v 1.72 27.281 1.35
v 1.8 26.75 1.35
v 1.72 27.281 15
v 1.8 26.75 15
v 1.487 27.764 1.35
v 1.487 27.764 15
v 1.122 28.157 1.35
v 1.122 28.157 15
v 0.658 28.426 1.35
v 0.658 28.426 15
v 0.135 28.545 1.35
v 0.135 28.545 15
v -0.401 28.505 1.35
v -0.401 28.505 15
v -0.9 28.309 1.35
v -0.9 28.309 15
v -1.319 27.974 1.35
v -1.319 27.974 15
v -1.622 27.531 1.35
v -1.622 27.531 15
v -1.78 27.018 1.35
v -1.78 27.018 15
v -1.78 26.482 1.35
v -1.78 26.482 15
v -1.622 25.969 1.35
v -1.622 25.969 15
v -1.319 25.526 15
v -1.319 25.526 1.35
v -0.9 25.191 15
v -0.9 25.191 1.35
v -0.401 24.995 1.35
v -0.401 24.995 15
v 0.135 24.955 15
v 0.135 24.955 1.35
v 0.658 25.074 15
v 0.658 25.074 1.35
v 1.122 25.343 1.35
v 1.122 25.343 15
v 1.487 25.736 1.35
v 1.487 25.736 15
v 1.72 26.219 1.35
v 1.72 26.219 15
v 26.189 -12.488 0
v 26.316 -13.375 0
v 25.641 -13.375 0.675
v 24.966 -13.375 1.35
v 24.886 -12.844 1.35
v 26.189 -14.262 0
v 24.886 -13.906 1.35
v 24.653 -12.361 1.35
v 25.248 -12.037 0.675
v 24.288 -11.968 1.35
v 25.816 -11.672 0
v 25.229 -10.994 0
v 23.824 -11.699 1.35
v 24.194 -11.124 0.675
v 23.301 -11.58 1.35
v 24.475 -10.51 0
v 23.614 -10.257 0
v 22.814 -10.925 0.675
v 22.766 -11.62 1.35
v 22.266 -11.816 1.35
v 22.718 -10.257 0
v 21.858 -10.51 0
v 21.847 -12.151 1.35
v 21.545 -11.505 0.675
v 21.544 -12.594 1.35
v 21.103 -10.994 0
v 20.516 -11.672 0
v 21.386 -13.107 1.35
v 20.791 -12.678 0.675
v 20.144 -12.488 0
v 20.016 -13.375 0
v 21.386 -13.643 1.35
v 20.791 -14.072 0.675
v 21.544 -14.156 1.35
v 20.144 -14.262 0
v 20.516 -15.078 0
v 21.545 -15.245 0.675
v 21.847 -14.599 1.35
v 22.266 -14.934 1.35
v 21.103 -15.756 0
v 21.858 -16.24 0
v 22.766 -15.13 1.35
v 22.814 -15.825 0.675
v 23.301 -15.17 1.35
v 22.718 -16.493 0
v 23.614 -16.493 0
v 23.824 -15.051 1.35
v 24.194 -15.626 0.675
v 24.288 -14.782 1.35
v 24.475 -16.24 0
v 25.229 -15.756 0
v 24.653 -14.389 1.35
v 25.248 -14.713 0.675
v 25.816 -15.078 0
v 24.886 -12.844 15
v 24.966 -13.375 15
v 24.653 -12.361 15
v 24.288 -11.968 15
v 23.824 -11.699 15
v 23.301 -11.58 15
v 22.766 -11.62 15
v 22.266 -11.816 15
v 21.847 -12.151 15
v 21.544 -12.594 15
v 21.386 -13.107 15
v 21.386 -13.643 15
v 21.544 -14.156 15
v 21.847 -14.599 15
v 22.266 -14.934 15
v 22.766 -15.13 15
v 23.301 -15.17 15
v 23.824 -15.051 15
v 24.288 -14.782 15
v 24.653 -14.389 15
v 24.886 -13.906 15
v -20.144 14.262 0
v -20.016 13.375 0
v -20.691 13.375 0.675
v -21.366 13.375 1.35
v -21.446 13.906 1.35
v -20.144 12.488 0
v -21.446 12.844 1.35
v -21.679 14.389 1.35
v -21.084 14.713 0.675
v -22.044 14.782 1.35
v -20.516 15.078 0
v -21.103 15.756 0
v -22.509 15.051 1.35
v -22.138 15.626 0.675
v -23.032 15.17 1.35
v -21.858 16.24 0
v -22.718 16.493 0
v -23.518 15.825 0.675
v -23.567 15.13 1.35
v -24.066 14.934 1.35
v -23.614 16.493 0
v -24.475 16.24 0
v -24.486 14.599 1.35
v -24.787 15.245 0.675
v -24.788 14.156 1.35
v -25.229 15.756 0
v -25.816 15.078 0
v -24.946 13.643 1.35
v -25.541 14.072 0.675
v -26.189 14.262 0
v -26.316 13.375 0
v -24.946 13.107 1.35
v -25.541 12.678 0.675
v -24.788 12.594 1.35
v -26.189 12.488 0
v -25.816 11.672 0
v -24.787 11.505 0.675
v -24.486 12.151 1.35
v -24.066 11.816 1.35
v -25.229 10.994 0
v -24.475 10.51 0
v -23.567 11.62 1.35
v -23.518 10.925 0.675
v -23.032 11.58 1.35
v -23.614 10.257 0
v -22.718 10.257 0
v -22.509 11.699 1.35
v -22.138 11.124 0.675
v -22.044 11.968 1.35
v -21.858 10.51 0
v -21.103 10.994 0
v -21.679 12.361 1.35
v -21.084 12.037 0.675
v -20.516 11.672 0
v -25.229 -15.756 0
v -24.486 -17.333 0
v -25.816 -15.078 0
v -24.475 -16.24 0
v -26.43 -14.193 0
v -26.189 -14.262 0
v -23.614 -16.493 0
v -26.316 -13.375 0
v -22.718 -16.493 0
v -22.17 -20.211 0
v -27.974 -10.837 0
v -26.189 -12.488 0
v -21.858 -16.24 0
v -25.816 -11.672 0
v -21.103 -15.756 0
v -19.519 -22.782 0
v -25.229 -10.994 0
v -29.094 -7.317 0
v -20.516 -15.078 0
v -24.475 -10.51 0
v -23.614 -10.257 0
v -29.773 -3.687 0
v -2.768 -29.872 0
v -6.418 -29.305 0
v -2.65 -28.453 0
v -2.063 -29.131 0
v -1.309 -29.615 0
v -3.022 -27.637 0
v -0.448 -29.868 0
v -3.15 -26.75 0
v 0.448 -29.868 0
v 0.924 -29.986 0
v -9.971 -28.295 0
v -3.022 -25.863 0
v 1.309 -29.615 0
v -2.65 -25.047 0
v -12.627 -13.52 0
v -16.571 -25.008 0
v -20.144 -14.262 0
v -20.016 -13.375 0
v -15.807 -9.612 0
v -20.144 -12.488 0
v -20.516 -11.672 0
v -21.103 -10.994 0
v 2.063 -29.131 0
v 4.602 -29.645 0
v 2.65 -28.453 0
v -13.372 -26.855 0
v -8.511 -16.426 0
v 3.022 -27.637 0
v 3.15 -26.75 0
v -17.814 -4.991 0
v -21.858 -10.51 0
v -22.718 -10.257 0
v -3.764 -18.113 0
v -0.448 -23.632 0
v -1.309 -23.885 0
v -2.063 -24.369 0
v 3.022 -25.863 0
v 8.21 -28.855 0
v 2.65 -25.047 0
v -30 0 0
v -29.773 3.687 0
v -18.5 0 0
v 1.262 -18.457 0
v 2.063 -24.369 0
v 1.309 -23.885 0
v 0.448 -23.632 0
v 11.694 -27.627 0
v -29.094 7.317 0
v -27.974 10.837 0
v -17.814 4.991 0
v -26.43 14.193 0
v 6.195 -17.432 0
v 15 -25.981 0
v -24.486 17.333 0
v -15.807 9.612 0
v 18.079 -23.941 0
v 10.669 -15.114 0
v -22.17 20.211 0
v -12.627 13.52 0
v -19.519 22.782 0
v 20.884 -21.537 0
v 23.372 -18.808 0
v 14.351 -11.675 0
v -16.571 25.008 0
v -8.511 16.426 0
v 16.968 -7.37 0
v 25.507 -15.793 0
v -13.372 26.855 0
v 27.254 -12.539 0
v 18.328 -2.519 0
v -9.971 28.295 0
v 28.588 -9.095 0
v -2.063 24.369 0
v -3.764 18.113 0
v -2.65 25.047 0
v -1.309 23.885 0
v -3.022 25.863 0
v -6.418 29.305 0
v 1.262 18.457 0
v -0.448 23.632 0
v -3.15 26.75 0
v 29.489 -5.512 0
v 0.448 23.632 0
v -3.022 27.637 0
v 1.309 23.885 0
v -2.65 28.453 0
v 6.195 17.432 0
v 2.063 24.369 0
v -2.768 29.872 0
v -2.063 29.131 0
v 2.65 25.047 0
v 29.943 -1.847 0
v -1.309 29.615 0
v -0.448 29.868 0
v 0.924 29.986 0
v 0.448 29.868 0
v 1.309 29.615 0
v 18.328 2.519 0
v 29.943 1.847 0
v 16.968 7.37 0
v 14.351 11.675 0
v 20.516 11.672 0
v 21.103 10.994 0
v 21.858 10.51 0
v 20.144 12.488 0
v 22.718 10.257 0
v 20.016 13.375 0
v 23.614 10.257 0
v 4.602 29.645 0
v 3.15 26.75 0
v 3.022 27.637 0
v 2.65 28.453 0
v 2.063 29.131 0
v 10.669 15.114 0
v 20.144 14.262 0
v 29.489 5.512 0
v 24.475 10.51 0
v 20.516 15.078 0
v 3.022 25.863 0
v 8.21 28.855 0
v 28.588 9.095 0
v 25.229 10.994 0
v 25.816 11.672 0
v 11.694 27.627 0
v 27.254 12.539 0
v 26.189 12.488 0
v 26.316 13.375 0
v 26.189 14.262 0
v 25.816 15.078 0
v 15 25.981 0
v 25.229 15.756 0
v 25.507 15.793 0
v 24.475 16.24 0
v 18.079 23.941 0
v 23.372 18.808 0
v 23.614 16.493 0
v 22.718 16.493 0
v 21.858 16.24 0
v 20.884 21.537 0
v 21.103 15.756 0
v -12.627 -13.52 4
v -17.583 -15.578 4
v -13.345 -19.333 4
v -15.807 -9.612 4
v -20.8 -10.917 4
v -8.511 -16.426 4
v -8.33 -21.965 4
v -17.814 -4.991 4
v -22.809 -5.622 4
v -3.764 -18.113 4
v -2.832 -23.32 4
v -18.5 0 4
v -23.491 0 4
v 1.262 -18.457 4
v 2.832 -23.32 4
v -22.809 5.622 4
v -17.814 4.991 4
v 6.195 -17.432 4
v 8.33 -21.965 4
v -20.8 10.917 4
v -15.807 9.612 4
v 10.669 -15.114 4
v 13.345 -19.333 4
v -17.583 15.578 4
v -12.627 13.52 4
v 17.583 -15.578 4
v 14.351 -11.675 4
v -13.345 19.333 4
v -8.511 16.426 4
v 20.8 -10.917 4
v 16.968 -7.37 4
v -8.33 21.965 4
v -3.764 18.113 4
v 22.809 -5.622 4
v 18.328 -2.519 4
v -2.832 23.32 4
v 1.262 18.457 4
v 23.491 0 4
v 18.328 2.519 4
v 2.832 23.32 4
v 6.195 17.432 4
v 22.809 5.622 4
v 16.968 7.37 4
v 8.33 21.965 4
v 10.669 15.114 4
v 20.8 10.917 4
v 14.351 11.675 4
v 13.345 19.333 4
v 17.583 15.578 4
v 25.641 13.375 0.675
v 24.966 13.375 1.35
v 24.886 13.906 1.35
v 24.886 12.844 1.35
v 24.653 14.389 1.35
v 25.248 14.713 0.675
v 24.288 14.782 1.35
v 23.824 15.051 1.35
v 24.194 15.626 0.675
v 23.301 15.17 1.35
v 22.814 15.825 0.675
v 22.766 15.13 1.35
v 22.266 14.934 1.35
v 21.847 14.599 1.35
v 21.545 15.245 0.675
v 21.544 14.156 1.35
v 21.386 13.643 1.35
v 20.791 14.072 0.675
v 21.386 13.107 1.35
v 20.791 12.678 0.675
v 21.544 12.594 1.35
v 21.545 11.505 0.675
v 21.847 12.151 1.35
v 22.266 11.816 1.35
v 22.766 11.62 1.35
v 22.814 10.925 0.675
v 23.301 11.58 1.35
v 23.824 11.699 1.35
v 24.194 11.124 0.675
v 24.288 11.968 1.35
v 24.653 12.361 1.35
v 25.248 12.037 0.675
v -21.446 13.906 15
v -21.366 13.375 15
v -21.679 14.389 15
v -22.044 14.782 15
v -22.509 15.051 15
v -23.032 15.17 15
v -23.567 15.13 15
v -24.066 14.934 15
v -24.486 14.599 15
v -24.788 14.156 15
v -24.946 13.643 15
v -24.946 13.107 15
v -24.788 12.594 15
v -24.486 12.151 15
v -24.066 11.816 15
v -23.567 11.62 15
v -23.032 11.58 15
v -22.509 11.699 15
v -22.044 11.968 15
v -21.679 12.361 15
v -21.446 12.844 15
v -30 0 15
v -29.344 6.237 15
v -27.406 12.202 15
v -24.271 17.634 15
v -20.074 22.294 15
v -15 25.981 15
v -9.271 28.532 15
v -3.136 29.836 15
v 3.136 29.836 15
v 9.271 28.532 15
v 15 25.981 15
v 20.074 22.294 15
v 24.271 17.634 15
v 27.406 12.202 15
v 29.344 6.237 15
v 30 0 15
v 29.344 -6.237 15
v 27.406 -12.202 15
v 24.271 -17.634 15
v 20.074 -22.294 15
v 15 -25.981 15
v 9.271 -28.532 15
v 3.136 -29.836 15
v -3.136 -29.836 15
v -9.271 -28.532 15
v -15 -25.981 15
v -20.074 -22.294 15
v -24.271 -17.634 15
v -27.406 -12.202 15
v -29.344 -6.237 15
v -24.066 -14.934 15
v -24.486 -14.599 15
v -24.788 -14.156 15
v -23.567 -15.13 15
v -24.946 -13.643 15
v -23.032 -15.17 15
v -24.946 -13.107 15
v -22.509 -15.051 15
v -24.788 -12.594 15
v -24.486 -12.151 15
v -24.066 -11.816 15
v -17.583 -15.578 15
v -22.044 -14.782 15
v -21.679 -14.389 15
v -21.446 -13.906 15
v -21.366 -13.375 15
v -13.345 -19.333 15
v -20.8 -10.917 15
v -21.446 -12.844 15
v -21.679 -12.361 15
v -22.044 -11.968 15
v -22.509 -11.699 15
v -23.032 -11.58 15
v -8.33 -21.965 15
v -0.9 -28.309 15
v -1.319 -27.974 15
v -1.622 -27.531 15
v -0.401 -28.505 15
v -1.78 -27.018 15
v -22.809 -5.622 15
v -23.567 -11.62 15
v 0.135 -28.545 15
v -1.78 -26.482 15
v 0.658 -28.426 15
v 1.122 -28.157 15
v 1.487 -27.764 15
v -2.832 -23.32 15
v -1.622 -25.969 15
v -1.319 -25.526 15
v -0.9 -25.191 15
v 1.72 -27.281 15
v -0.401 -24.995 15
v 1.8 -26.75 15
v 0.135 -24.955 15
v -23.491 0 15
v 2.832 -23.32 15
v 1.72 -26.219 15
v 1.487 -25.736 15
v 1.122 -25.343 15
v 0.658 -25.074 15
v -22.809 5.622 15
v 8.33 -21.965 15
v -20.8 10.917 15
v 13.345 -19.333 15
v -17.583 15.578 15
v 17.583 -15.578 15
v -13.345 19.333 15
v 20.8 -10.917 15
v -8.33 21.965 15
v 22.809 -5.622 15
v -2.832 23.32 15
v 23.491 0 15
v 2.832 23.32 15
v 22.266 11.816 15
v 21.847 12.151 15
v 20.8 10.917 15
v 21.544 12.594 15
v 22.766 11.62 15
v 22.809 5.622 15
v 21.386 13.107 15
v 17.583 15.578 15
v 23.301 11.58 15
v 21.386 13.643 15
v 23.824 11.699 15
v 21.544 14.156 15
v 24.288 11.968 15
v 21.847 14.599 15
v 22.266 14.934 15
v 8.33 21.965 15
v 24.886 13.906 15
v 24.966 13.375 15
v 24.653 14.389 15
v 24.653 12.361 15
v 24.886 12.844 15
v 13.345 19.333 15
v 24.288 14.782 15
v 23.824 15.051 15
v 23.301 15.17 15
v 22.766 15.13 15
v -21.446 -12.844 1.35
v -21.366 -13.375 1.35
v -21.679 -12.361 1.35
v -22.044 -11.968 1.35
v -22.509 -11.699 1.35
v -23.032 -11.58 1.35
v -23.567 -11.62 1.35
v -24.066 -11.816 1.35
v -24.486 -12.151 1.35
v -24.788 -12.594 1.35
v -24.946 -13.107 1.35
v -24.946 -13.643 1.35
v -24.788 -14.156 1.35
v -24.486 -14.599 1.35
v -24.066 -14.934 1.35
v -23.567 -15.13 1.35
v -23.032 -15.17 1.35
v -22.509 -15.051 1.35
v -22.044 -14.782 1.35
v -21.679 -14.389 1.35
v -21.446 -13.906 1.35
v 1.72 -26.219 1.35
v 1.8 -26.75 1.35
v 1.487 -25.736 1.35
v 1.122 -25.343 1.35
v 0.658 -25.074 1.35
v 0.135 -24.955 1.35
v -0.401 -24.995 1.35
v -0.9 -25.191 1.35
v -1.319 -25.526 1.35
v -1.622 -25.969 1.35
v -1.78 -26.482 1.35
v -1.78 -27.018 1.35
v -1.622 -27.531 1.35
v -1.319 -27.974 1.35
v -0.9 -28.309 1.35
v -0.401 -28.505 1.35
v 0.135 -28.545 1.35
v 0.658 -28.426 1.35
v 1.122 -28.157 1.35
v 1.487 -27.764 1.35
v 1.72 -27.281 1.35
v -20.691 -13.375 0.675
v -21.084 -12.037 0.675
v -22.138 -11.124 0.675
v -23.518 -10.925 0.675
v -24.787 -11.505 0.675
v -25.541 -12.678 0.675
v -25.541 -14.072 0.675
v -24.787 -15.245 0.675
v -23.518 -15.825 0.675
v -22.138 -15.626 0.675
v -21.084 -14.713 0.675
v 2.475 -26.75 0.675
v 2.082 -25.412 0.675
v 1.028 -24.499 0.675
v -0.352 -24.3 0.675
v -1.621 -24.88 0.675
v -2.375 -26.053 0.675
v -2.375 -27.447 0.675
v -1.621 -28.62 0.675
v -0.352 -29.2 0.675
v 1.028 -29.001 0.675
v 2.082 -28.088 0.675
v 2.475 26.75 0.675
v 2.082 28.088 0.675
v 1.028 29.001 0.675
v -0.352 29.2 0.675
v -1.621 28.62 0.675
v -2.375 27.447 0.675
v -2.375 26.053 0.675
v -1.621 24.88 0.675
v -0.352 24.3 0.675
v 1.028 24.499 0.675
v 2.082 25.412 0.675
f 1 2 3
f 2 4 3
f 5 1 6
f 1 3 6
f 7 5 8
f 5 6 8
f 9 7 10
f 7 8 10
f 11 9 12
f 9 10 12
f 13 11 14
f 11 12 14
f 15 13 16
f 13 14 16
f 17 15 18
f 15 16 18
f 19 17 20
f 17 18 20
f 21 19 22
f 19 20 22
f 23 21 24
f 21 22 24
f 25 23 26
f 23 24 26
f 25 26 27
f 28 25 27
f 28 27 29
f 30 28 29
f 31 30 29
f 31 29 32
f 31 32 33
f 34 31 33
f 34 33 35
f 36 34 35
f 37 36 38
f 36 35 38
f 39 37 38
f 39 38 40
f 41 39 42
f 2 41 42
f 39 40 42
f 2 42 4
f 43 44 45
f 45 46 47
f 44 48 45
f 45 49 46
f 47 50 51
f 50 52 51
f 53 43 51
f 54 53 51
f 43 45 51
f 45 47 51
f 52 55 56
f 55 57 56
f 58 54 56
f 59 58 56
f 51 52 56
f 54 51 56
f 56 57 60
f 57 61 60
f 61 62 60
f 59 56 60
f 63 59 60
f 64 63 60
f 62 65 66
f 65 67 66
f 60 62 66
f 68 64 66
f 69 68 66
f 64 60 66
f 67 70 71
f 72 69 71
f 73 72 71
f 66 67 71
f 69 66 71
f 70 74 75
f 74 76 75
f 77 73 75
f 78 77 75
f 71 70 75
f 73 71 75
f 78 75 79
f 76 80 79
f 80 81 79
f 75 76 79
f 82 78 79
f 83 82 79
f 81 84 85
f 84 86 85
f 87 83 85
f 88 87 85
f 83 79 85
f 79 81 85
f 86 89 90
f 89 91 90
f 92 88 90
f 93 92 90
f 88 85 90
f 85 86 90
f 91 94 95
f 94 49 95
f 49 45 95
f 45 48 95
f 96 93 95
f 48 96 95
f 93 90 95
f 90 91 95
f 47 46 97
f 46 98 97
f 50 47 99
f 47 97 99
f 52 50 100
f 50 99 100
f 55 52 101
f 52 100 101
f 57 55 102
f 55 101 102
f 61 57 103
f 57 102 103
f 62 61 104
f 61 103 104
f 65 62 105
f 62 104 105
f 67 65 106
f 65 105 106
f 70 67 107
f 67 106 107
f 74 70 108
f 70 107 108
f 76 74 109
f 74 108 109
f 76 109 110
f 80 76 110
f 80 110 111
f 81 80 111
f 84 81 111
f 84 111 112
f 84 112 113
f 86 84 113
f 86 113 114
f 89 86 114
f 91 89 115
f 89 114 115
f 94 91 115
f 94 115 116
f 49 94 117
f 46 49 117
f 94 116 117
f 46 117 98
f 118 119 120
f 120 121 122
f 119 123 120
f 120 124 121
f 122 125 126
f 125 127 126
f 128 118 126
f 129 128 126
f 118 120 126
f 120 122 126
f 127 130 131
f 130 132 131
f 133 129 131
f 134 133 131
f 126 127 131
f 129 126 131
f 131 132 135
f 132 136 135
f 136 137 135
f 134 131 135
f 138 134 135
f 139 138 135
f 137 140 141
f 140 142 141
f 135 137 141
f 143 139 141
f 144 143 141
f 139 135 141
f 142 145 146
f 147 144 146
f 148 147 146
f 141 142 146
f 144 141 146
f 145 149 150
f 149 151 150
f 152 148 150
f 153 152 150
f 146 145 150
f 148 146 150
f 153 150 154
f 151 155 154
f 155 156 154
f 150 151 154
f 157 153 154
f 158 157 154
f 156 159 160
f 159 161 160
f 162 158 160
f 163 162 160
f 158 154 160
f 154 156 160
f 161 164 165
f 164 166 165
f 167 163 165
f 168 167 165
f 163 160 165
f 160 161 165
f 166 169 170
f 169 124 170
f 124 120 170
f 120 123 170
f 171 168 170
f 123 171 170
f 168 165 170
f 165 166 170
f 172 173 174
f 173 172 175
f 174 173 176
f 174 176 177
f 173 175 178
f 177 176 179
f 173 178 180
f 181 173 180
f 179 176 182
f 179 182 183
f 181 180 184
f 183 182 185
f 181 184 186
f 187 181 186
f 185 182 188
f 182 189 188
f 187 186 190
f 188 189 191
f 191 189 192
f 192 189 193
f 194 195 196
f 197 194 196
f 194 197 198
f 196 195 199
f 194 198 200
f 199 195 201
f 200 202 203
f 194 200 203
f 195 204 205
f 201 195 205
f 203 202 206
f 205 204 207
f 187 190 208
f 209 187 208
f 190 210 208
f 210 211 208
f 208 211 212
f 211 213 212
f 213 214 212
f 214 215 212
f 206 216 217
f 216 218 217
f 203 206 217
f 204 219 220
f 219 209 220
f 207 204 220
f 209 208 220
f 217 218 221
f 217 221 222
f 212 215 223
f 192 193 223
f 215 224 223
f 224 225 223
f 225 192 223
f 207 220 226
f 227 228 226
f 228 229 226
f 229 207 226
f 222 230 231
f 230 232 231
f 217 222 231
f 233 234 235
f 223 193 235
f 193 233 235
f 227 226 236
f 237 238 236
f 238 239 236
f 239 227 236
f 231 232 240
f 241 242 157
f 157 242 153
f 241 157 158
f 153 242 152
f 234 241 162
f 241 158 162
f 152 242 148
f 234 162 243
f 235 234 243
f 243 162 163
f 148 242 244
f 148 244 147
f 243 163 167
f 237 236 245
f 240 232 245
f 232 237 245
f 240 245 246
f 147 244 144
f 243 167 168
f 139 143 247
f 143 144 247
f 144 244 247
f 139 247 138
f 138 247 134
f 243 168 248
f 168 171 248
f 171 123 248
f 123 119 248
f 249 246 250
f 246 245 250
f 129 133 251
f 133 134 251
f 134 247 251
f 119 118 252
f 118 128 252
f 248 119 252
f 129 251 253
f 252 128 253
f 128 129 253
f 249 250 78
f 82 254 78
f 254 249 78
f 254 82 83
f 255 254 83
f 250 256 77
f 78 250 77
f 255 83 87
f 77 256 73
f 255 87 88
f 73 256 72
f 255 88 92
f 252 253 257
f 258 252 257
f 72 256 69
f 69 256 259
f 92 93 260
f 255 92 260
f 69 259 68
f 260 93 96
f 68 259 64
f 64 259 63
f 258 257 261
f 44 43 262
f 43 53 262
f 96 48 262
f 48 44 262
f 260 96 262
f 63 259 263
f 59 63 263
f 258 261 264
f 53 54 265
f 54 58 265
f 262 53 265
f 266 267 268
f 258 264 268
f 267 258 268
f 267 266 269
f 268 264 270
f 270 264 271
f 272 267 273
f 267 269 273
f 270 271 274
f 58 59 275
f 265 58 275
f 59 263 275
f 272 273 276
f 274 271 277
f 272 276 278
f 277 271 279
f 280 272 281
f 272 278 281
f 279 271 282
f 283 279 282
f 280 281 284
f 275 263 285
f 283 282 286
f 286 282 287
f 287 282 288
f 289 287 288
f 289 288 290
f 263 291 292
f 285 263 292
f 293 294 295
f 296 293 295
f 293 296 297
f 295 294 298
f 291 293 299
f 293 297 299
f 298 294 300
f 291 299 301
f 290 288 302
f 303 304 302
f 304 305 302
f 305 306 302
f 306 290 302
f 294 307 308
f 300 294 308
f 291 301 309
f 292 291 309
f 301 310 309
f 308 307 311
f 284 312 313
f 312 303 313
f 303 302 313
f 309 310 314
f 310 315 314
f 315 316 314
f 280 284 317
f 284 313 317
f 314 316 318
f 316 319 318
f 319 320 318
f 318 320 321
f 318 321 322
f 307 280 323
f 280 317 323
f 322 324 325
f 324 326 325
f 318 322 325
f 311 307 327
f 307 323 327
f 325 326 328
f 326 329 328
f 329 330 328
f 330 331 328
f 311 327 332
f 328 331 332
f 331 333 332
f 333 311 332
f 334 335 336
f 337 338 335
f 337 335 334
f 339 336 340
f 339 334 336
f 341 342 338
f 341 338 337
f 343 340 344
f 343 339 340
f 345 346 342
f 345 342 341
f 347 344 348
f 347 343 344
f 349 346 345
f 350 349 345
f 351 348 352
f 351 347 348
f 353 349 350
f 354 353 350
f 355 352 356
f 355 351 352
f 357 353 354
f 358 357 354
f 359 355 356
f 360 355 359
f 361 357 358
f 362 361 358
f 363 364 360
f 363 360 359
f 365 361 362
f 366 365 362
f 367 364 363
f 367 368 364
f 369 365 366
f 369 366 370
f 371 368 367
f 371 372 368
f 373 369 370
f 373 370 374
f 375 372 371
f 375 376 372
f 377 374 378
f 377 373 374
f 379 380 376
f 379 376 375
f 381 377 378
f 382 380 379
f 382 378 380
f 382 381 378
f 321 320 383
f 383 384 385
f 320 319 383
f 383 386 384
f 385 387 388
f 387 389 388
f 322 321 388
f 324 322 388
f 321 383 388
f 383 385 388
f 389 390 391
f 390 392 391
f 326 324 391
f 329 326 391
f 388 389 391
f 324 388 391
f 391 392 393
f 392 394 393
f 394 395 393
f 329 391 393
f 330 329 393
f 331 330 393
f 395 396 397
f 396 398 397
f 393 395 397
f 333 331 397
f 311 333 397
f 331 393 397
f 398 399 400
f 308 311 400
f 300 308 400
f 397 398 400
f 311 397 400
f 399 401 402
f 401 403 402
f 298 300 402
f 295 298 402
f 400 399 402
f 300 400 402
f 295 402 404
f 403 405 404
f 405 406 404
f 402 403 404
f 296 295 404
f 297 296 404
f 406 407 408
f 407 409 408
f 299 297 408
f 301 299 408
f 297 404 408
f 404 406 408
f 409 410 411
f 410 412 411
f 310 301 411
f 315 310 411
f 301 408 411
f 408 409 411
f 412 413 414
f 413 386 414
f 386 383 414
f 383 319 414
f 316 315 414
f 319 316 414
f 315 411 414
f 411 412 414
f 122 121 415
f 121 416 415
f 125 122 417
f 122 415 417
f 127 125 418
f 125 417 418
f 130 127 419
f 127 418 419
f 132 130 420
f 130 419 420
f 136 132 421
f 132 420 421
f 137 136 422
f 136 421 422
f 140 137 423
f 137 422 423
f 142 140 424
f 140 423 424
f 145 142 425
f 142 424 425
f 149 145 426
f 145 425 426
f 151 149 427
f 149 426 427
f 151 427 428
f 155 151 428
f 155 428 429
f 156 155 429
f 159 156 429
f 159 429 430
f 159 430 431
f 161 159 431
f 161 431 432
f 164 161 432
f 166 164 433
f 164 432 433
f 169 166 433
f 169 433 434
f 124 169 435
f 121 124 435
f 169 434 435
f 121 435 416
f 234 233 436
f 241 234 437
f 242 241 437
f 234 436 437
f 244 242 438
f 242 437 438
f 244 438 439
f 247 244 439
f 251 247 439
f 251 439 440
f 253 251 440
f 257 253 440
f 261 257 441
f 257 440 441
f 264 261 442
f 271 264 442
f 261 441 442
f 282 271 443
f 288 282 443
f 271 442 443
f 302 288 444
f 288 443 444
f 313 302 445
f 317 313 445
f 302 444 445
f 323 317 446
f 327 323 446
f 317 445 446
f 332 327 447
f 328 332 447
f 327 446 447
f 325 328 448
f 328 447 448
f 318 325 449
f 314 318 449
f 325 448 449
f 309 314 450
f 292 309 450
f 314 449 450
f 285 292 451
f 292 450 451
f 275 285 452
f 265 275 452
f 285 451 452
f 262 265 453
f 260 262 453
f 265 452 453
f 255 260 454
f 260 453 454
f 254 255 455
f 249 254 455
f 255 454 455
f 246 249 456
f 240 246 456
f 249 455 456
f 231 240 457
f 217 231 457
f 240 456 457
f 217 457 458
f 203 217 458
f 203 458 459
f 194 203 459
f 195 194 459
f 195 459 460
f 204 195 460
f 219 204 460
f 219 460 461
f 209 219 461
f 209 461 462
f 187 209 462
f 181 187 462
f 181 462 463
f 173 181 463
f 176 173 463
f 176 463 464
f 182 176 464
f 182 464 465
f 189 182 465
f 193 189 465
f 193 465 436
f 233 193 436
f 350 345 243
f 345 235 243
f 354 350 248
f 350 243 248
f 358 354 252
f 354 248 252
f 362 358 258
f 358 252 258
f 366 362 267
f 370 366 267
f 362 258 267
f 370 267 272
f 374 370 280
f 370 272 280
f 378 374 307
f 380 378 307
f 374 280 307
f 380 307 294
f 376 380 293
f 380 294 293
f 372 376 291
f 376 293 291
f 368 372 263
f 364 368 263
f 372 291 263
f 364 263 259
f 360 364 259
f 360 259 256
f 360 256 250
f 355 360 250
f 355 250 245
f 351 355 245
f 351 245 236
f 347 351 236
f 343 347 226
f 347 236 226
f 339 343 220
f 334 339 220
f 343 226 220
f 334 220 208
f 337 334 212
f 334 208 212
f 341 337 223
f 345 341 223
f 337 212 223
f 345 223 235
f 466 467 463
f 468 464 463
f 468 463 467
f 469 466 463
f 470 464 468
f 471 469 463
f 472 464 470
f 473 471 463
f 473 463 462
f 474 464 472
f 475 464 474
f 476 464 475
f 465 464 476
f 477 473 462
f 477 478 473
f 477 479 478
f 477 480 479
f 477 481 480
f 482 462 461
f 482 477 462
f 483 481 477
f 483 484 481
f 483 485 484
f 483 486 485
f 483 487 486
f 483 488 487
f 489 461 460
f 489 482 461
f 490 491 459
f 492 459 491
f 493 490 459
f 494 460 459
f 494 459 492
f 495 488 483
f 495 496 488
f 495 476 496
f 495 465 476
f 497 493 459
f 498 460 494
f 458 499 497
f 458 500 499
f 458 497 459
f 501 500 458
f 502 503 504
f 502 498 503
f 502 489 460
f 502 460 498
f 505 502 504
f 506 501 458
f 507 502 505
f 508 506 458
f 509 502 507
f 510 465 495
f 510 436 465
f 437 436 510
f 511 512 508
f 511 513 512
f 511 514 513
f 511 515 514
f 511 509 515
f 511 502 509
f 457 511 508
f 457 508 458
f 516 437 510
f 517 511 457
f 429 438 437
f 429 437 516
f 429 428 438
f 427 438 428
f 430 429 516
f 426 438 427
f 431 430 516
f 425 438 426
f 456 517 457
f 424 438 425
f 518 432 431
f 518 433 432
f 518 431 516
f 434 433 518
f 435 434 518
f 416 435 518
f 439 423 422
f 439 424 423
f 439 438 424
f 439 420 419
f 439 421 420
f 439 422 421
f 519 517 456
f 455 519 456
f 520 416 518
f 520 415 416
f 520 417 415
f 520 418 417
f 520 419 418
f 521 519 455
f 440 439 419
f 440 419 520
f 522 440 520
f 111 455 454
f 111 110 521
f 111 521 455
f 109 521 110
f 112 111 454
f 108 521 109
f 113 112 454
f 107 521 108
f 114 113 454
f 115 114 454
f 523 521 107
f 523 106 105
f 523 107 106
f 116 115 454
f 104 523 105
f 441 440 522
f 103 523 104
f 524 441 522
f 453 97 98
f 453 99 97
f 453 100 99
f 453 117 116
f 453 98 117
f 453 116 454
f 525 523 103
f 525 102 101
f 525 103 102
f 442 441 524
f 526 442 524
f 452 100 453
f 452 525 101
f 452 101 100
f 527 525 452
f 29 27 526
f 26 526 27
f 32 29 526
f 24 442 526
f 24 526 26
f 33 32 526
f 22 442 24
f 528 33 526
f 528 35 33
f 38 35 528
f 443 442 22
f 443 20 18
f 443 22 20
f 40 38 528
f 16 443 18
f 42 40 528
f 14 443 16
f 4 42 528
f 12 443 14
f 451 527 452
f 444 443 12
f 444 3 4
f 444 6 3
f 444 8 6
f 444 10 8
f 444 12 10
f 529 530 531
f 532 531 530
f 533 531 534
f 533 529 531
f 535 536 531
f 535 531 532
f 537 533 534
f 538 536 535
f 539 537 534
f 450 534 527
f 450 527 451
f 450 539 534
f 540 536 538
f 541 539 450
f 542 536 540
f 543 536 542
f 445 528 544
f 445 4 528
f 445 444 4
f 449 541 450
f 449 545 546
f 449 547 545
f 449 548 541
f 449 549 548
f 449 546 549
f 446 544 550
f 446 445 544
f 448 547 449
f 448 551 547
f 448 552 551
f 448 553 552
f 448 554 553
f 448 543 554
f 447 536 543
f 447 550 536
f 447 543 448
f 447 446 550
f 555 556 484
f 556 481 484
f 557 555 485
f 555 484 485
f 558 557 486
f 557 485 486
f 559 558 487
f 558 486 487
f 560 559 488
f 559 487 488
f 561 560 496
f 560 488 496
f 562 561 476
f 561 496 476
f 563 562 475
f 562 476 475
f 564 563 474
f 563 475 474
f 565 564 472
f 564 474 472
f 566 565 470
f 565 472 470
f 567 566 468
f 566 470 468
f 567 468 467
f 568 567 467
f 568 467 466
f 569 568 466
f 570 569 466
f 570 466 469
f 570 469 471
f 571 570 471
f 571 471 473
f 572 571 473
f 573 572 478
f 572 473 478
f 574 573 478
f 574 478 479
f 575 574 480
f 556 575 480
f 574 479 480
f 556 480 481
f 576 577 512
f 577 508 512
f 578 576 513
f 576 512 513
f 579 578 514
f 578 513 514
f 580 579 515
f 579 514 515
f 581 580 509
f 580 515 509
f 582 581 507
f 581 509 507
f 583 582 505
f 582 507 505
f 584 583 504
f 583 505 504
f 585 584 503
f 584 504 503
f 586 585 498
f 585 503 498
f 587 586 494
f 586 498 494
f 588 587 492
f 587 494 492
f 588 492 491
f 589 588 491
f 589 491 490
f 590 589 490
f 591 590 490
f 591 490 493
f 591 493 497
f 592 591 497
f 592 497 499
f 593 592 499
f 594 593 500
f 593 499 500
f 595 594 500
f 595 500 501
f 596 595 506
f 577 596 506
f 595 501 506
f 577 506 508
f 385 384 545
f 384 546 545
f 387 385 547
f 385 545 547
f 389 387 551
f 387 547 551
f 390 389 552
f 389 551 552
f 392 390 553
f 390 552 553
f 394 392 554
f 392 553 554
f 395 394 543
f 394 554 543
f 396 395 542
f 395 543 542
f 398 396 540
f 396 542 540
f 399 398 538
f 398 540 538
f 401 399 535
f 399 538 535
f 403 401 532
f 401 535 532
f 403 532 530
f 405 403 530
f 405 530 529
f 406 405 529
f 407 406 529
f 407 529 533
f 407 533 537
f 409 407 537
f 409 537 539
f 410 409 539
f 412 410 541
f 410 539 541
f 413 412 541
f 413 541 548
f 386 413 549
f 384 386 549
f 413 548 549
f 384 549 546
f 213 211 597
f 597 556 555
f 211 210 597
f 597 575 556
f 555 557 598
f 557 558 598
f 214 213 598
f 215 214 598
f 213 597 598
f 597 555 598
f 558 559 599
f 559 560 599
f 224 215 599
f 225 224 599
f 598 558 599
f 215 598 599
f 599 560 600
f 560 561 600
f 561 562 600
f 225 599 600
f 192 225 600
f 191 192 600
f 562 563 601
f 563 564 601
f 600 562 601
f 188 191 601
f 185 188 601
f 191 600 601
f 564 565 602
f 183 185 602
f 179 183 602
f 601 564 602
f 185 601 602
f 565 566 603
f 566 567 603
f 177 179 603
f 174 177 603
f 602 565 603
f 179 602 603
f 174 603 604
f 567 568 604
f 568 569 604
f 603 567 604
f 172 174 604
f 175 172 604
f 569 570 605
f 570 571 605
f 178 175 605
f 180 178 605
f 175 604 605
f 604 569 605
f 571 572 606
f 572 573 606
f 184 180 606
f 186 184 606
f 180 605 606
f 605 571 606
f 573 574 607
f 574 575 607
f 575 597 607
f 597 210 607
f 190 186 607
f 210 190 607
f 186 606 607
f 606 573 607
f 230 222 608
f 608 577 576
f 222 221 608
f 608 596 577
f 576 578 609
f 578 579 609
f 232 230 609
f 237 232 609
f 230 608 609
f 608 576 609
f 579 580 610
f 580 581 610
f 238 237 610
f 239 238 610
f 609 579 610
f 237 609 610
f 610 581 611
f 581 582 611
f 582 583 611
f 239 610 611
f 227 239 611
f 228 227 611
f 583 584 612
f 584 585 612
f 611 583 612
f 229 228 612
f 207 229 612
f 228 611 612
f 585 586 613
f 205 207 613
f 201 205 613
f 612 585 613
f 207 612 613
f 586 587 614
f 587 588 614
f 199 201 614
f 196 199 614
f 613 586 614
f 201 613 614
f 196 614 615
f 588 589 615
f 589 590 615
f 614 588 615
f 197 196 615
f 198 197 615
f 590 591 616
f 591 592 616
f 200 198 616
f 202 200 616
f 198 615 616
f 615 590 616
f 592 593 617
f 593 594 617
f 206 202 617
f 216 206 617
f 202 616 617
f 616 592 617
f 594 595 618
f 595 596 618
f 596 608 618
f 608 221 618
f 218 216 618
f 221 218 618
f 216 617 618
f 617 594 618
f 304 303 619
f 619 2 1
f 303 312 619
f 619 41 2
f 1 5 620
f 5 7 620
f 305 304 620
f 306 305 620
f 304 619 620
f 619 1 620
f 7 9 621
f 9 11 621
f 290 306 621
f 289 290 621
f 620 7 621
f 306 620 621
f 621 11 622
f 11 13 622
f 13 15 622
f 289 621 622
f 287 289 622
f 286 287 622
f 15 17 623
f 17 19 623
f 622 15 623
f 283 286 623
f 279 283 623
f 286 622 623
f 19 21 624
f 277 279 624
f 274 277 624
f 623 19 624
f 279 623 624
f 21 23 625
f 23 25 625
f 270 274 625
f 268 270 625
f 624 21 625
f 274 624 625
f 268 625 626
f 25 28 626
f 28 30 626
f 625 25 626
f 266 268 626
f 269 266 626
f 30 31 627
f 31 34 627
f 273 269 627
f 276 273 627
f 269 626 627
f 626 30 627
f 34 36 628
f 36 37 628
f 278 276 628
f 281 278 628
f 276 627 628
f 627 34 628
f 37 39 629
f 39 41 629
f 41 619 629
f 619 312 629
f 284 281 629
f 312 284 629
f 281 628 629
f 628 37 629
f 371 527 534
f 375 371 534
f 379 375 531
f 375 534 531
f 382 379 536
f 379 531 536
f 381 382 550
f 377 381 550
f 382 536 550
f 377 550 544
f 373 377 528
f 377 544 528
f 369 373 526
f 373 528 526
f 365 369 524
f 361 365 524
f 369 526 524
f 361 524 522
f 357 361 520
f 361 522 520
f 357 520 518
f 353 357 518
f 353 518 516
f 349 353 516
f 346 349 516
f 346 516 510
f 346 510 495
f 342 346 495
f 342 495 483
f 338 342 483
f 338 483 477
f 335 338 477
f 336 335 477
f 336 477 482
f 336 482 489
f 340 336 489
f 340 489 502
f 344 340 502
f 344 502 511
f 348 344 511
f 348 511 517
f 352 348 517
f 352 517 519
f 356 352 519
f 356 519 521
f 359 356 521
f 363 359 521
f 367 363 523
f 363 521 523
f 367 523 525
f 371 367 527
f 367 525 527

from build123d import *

# Parameters (mm, degrees)
SKETCH1_W                                       = 30
SKETCH1_H                                       = 15
CSK_FOR_M3_FLAT_HEAD_MACHINE_SCREW1_D           = 3.6
CSK_FOR_M3_FLAT_HEAD_MACHINE_SCREW1_CSINK_D     = 6.3
CSK_FOR_M3_FLAT_HEAD_MACHINE_SCREW1_CSINK_ANGLE = 90
HOLE1_D                                         = 37
HOLE1_CBORE_D                                   = 46.98238
HOLE1_CBORE_DEPTH                               = 11


with BuildPart() as part:
    # Sketch1 → Revolve1 (revolve)
    with BuildSketch(Plane.XZ, mode=Mode.PRIVATE) as revolve1_sk:
        with Locations((15, 7.5)):
            Rectangle(SKETCH1_W, SKETCH1_H)
    revolve(revolve1_sk.sketch.rotate(Axis((0, 0, 15), (0, 0, -1)), 180), axis=Axis((0, 0, 15), (0, 0, -1)))

    # CSK for M3 Flat Head Machine Screw1 (through all)
    with Locations(Plane(origin=(0, 0, 0), x_dir=(-1, 0, 0), z_dir=(0, 0, -1))):
        with Locations((23.166179551, -13.375), (23.166179551, 13.375), (0, -26.75), (-23.166179551, 13.375), (-23.166179551, -13.375), (0, 26.75)):
            CounterSinkHole(CSK_FOR_M3_FLAT_HEAD_MACHINE_SCREW1_D / 2, CSK_FOR_M3_FLAT_HEAD_MACHINE_SCREW1_CSINK_D / 2, counter_sink_angle=CSK_FOR_M3_FLAT_HEAD_MACHINE_SCREW1_CSINK_ANGLE)

    # Hole1 (through all)
    with Locations(Plane.XY.offset(15)):
        with Locations((0, 0)):
            CounterBoreHole(HOLE1_D / 2, HOLE1_CBORE_D / 2, HOLE1_CBORE_DEPTH)


solid = part.part
